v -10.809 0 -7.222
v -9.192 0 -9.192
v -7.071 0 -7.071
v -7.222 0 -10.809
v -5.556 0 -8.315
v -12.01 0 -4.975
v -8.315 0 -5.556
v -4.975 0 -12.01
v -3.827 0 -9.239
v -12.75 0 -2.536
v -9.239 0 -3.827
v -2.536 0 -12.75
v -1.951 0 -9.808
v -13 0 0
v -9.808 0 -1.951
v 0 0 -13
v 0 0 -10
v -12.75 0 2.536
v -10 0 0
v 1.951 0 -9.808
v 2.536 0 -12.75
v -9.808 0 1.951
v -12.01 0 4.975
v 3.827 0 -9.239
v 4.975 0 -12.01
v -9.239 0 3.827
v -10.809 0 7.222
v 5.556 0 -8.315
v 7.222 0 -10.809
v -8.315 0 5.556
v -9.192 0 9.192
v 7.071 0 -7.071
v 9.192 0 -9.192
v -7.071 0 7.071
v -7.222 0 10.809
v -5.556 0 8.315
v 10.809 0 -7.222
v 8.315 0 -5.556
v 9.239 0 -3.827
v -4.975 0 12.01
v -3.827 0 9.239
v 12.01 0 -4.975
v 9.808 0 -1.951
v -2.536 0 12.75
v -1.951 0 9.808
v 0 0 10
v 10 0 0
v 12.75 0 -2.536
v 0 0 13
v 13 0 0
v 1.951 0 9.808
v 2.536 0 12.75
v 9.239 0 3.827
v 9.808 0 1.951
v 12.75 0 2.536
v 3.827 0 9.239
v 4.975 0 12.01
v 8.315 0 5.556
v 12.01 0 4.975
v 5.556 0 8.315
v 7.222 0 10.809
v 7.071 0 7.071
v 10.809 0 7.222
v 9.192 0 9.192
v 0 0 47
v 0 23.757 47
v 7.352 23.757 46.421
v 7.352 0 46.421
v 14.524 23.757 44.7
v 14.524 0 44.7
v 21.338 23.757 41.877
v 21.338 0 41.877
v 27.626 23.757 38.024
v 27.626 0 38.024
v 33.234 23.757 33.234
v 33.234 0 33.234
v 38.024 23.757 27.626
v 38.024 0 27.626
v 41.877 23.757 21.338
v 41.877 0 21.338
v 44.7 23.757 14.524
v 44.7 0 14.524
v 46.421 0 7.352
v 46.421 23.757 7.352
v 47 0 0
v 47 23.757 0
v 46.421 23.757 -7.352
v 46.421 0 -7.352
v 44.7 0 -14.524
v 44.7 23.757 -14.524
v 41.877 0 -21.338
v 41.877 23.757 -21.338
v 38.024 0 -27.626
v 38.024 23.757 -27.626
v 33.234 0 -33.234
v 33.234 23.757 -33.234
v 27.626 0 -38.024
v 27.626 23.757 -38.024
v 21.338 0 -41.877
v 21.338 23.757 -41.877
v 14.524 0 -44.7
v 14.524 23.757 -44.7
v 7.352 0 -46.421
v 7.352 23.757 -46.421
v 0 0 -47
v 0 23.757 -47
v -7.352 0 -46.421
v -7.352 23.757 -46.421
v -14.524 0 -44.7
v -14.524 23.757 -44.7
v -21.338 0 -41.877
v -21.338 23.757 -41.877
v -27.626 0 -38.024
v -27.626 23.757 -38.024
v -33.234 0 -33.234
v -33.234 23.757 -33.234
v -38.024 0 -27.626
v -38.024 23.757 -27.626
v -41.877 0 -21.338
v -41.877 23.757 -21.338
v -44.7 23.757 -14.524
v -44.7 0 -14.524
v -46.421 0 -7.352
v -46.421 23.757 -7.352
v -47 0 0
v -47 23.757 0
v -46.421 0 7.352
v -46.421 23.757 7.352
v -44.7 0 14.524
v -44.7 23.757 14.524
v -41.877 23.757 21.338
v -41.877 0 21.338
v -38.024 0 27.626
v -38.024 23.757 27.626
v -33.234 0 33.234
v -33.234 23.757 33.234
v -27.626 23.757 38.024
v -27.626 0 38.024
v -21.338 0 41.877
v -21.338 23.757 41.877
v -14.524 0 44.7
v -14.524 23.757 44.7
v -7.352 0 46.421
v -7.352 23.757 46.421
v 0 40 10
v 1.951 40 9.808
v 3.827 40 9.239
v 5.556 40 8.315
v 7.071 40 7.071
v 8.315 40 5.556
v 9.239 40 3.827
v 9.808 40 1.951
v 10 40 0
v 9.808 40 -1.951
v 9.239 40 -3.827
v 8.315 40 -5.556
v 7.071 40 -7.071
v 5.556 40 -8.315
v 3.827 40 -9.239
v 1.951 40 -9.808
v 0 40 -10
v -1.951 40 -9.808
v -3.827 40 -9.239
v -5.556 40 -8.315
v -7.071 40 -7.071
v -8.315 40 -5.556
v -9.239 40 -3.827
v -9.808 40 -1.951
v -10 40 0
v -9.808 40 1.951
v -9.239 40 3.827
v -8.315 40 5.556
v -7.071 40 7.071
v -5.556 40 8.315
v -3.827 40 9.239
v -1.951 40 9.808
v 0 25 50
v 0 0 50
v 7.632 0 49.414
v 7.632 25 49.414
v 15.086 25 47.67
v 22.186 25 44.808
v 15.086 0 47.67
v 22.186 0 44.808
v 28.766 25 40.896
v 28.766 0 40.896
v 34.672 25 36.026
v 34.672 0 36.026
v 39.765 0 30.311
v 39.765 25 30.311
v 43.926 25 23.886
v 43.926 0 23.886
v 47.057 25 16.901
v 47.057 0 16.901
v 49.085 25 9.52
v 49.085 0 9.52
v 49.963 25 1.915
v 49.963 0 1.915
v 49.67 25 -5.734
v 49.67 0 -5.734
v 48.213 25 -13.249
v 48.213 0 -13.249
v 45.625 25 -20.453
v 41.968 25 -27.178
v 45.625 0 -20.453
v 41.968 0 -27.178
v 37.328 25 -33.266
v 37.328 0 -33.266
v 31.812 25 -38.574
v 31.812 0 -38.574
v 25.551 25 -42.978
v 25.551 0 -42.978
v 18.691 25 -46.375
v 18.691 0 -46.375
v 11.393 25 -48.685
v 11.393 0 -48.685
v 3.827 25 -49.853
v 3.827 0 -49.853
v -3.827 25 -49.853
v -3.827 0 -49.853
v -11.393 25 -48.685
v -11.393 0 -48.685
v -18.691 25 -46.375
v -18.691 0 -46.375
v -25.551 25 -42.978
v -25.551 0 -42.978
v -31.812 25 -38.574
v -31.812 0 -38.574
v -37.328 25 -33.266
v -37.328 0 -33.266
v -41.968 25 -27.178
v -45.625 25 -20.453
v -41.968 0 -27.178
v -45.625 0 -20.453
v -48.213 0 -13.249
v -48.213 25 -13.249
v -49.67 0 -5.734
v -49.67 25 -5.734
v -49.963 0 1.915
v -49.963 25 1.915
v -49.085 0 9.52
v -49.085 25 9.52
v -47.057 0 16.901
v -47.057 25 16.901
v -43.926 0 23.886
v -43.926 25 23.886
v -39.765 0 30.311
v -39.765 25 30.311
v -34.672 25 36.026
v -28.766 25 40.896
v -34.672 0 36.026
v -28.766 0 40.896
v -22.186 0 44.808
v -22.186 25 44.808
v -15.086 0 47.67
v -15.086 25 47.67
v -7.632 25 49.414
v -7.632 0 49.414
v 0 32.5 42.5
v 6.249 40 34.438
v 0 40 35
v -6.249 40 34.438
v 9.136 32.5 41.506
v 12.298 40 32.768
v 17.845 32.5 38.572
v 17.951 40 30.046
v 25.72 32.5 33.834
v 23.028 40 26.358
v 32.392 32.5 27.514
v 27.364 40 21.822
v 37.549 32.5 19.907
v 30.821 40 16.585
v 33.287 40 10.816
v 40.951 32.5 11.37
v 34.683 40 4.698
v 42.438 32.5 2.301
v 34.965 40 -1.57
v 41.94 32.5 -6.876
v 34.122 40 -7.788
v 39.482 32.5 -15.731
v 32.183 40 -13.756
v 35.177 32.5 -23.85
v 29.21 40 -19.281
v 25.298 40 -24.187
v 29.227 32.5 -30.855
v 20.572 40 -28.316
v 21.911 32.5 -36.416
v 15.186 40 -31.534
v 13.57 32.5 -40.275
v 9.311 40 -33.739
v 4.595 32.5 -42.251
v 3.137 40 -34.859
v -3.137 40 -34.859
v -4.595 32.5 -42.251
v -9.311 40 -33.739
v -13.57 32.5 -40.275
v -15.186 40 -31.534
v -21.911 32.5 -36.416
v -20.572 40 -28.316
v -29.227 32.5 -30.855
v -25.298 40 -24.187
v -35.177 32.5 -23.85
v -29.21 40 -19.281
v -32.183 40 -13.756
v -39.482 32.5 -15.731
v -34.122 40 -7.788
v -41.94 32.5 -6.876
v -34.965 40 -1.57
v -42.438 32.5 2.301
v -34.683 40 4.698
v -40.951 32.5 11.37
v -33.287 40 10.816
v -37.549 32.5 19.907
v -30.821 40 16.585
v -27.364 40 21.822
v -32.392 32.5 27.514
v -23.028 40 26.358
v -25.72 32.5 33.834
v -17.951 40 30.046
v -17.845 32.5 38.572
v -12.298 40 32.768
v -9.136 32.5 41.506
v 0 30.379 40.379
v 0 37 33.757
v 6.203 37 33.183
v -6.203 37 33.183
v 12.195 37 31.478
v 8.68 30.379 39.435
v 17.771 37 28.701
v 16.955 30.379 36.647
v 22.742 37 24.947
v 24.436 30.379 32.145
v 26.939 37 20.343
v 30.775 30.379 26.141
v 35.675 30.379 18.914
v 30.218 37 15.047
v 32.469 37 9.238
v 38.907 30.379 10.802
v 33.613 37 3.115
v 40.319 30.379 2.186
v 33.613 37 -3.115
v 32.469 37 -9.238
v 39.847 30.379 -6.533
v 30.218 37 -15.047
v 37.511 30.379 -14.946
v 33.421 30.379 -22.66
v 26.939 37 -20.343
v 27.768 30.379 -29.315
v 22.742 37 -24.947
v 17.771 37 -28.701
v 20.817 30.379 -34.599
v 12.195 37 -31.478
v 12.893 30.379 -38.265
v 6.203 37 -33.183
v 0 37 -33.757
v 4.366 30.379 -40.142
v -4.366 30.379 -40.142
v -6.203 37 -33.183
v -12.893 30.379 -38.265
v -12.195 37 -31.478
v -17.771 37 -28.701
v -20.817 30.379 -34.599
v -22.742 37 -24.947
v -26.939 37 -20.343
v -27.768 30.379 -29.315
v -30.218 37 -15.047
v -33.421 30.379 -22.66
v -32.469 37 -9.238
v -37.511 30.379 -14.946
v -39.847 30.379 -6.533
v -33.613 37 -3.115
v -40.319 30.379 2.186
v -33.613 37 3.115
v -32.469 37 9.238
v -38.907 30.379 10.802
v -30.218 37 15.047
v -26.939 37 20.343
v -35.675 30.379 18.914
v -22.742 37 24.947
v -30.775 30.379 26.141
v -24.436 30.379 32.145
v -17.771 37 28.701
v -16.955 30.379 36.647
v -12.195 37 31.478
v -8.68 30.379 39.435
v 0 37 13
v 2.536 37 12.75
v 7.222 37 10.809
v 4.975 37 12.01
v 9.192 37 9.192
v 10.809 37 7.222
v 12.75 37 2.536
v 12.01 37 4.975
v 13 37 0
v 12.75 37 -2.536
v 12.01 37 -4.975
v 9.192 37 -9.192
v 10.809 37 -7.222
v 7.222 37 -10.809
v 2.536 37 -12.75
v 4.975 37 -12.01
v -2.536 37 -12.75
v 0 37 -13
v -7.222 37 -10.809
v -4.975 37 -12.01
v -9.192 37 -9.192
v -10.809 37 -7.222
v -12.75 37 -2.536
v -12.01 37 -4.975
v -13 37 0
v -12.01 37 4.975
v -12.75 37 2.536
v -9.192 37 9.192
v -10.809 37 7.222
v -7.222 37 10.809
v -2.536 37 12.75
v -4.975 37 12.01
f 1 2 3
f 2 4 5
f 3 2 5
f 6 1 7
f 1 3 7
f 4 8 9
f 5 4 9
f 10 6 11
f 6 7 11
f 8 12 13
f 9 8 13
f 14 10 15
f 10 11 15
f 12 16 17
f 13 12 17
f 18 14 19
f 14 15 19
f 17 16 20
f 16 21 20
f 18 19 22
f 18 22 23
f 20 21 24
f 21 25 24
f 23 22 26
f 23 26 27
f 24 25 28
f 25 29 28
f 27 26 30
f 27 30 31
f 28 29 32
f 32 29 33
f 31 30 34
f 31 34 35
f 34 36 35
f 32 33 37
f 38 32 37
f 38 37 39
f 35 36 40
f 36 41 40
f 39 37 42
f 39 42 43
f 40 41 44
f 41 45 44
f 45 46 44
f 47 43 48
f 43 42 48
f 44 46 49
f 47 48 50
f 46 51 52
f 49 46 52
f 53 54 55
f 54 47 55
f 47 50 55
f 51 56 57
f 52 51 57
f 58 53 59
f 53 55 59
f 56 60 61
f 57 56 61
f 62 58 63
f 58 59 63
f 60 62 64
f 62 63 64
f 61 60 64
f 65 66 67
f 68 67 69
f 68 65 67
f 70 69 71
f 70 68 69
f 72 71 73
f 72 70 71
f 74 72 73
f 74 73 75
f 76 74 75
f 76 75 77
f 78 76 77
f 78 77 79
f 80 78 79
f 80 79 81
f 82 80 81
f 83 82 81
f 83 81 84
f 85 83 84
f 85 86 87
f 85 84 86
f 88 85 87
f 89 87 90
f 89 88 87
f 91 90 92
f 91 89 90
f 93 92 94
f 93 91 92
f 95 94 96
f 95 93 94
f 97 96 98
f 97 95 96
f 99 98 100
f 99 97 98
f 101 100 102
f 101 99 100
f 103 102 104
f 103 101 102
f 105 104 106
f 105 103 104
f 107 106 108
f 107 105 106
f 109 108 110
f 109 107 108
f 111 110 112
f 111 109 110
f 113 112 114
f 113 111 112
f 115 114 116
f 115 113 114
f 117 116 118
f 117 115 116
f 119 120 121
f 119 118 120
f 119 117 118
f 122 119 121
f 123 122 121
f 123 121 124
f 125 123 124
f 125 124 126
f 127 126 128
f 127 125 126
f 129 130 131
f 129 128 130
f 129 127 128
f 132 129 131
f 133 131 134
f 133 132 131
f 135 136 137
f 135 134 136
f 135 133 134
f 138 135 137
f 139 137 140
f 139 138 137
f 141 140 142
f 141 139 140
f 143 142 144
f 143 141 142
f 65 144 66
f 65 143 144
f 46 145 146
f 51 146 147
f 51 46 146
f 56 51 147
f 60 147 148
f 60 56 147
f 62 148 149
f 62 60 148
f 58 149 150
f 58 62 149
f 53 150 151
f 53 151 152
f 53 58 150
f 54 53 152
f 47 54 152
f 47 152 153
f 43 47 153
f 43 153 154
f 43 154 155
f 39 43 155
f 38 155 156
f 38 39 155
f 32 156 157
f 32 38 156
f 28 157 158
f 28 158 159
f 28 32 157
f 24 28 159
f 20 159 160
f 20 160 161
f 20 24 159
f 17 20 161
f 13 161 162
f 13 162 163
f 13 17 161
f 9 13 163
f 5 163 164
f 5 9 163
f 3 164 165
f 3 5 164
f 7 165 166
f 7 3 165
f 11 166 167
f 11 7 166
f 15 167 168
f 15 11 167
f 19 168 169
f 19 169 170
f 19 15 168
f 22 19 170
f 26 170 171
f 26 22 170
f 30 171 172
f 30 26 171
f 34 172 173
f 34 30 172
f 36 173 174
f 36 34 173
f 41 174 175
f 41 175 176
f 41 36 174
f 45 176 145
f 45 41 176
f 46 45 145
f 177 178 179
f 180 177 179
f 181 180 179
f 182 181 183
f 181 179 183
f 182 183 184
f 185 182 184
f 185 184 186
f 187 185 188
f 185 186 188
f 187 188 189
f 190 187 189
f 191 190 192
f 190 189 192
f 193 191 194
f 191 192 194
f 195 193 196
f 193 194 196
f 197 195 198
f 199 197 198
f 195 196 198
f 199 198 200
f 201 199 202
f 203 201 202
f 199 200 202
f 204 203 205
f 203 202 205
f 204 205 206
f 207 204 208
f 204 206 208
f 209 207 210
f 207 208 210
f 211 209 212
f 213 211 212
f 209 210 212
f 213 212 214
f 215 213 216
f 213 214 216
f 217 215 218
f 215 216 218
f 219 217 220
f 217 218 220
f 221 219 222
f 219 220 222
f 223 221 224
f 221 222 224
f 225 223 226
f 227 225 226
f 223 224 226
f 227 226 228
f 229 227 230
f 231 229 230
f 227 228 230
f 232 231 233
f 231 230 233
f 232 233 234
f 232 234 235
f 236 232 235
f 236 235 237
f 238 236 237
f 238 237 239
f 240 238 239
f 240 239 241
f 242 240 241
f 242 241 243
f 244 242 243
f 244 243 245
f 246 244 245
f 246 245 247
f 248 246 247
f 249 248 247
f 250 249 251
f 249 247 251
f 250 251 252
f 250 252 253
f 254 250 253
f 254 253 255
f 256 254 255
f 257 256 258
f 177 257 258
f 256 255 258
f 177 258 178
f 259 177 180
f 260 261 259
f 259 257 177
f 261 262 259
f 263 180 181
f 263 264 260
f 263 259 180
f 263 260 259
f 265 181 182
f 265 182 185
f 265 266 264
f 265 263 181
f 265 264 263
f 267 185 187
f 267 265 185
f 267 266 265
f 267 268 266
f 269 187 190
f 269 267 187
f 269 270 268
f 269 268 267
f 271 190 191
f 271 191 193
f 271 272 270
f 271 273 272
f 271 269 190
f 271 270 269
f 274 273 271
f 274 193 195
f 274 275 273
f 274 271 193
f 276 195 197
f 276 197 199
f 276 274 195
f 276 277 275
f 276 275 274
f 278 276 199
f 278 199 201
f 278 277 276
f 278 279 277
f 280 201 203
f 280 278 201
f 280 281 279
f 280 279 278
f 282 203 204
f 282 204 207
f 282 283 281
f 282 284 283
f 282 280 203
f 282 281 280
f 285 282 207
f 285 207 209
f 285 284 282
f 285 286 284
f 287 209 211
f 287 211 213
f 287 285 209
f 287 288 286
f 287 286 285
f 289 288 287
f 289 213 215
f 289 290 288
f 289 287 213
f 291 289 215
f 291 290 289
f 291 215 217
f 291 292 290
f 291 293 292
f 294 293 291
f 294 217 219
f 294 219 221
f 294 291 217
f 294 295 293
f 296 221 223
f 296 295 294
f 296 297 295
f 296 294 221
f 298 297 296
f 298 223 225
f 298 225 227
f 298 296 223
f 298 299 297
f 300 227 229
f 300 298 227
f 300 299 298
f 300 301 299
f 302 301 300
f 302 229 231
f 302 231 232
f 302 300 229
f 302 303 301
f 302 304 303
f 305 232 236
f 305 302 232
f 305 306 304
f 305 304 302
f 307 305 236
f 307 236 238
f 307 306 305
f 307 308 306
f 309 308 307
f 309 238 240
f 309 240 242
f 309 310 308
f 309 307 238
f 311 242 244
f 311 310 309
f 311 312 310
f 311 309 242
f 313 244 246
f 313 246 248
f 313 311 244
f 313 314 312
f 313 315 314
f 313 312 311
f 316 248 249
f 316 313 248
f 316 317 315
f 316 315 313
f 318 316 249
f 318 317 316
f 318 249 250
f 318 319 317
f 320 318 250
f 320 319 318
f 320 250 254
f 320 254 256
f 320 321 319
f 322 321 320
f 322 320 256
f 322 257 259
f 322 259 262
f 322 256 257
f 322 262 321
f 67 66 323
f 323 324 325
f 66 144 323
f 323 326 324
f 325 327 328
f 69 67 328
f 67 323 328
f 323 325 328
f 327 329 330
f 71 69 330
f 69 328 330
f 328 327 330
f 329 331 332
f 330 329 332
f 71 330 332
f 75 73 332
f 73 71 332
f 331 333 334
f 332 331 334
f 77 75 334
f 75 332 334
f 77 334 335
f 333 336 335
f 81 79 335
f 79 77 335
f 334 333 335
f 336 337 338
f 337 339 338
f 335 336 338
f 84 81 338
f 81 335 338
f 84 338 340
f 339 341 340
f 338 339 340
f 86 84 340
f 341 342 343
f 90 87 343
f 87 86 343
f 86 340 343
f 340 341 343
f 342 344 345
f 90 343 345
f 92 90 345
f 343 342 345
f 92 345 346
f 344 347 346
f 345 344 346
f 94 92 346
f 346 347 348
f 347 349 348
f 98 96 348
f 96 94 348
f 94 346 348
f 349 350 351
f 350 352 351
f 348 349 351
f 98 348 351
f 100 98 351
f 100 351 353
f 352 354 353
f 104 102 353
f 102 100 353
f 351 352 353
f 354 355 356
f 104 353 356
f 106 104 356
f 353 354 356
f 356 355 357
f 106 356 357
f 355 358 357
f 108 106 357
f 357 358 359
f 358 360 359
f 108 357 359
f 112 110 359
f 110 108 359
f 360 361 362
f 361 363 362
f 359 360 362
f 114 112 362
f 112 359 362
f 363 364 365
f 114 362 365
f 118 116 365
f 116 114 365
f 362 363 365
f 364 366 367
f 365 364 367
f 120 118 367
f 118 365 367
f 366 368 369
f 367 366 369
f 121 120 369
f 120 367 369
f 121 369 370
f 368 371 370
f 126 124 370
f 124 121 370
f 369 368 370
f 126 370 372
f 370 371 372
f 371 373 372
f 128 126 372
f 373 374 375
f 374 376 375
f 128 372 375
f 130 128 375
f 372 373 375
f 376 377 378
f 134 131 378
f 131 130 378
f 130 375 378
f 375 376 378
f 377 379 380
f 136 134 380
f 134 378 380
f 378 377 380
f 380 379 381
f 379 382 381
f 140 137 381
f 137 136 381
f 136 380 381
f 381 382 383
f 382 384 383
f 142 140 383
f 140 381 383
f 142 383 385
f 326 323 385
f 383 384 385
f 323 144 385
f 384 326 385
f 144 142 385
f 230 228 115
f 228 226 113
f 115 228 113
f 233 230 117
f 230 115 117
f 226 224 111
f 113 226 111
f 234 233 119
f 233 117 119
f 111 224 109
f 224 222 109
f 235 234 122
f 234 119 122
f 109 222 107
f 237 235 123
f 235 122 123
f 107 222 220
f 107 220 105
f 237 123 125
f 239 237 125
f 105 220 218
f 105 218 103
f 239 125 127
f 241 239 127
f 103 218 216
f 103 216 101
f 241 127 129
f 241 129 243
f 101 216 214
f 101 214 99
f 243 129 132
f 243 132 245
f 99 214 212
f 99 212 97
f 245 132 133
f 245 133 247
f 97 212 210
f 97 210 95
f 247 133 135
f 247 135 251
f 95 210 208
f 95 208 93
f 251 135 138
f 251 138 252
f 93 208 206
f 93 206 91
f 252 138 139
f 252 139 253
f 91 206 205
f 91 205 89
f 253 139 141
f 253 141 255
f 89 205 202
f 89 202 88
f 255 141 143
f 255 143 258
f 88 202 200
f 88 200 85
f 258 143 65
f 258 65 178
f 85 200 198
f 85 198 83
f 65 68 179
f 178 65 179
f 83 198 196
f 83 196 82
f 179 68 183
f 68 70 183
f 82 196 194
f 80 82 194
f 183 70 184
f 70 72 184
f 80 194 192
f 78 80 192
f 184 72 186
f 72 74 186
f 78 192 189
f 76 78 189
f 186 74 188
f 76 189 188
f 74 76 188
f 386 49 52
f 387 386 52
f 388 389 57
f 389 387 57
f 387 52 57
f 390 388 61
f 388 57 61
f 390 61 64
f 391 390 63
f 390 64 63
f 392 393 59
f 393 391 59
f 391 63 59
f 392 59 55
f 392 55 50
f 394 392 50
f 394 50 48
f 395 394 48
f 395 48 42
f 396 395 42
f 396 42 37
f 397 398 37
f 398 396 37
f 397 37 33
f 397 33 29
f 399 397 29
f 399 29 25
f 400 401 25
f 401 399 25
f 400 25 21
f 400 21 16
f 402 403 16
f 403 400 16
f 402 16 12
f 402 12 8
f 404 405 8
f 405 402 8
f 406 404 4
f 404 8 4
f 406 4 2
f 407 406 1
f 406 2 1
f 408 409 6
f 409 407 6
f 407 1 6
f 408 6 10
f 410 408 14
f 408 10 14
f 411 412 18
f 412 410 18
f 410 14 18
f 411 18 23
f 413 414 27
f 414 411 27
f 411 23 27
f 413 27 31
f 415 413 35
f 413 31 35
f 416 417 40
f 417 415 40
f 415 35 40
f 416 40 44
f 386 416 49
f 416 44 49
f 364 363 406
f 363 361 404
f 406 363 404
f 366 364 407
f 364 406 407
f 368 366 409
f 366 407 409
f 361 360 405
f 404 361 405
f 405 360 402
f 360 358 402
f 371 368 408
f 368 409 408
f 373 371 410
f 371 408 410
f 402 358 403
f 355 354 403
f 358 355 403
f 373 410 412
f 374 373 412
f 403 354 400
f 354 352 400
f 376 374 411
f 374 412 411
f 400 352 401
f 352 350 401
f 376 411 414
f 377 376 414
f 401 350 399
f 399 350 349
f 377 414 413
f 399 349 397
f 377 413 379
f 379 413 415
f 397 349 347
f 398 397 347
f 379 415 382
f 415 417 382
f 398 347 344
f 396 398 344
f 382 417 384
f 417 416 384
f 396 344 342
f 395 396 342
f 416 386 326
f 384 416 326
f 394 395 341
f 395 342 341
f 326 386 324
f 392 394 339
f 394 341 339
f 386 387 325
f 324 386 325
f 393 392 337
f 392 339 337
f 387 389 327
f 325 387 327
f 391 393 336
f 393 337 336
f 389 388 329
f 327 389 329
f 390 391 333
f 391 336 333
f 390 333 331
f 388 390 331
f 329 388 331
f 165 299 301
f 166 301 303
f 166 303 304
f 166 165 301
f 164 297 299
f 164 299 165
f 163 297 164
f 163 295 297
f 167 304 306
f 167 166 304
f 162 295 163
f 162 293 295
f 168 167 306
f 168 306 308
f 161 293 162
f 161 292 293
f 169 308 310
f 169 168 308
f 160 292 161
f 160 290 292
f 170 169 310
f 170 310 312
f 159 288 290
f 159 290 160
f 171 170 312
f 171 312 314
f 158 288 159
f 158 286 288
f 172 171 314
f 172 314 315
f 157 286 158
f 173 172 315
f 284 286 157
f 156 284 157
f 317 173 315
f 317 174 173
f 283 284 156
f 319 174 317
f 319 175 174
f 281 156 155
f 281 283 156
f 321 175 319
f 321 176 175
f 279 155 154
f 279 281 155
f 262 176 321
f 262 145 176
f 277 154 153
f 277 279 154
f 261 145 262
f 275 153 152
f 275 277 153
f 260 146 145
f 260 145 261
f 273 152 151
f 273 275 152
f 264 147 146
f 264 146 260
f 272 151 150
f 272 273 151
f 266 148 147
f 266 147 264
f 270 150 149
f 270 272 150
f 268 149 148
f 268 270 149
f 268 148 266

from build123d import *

# Parameters (mm, degrees)
CROQUIS1_R              = 50
CROQUIS1_R_2            = 10
SALIENTE_EXTRUIR1_DEPTH = 40
CHAFL_N1_SIZE           = 15
VACIADO1_T              = -3


with BuildPart() as part:
    # Croquis1 → Saliente-Extruir1 (new body)
    with BuildSketch(Plane(origin=(0, 0, 0), x_dir=(1, 0, 0), z_dir=(0, 1, 0))):
        with Locations(Location((0, 0, 0), (0, 0, 270))):
            Circle(CROQUIS1_R)
        with Locations(Location((0, 0, 0), (0, 0, 270))):
            Circle(CROQUIS1_R_2, mode=Mode.SUBTRACT)
    extrude(amount=SALIENTE_EXTRUIR1_DEPTH)

    # Chaflán1
    chafl_n1_edges = [part.edges().sort_by_distance(p)[0] for p in [
        (0, 40, -50),
    ]]
    chamfer(chafl_n1_edges, length=CHAFL_N1_SIZE)

    # Vaciado1
    vaciado1_openings = [part.faces().sort_by_distance(p)[0] for p in [
        (0, 0, -48.585786438),
    ]]
    offset(amount=VACIADO1_T, openings=vaciado1_openings, kind=Kind.INTERSECTION)


solid = part.part
